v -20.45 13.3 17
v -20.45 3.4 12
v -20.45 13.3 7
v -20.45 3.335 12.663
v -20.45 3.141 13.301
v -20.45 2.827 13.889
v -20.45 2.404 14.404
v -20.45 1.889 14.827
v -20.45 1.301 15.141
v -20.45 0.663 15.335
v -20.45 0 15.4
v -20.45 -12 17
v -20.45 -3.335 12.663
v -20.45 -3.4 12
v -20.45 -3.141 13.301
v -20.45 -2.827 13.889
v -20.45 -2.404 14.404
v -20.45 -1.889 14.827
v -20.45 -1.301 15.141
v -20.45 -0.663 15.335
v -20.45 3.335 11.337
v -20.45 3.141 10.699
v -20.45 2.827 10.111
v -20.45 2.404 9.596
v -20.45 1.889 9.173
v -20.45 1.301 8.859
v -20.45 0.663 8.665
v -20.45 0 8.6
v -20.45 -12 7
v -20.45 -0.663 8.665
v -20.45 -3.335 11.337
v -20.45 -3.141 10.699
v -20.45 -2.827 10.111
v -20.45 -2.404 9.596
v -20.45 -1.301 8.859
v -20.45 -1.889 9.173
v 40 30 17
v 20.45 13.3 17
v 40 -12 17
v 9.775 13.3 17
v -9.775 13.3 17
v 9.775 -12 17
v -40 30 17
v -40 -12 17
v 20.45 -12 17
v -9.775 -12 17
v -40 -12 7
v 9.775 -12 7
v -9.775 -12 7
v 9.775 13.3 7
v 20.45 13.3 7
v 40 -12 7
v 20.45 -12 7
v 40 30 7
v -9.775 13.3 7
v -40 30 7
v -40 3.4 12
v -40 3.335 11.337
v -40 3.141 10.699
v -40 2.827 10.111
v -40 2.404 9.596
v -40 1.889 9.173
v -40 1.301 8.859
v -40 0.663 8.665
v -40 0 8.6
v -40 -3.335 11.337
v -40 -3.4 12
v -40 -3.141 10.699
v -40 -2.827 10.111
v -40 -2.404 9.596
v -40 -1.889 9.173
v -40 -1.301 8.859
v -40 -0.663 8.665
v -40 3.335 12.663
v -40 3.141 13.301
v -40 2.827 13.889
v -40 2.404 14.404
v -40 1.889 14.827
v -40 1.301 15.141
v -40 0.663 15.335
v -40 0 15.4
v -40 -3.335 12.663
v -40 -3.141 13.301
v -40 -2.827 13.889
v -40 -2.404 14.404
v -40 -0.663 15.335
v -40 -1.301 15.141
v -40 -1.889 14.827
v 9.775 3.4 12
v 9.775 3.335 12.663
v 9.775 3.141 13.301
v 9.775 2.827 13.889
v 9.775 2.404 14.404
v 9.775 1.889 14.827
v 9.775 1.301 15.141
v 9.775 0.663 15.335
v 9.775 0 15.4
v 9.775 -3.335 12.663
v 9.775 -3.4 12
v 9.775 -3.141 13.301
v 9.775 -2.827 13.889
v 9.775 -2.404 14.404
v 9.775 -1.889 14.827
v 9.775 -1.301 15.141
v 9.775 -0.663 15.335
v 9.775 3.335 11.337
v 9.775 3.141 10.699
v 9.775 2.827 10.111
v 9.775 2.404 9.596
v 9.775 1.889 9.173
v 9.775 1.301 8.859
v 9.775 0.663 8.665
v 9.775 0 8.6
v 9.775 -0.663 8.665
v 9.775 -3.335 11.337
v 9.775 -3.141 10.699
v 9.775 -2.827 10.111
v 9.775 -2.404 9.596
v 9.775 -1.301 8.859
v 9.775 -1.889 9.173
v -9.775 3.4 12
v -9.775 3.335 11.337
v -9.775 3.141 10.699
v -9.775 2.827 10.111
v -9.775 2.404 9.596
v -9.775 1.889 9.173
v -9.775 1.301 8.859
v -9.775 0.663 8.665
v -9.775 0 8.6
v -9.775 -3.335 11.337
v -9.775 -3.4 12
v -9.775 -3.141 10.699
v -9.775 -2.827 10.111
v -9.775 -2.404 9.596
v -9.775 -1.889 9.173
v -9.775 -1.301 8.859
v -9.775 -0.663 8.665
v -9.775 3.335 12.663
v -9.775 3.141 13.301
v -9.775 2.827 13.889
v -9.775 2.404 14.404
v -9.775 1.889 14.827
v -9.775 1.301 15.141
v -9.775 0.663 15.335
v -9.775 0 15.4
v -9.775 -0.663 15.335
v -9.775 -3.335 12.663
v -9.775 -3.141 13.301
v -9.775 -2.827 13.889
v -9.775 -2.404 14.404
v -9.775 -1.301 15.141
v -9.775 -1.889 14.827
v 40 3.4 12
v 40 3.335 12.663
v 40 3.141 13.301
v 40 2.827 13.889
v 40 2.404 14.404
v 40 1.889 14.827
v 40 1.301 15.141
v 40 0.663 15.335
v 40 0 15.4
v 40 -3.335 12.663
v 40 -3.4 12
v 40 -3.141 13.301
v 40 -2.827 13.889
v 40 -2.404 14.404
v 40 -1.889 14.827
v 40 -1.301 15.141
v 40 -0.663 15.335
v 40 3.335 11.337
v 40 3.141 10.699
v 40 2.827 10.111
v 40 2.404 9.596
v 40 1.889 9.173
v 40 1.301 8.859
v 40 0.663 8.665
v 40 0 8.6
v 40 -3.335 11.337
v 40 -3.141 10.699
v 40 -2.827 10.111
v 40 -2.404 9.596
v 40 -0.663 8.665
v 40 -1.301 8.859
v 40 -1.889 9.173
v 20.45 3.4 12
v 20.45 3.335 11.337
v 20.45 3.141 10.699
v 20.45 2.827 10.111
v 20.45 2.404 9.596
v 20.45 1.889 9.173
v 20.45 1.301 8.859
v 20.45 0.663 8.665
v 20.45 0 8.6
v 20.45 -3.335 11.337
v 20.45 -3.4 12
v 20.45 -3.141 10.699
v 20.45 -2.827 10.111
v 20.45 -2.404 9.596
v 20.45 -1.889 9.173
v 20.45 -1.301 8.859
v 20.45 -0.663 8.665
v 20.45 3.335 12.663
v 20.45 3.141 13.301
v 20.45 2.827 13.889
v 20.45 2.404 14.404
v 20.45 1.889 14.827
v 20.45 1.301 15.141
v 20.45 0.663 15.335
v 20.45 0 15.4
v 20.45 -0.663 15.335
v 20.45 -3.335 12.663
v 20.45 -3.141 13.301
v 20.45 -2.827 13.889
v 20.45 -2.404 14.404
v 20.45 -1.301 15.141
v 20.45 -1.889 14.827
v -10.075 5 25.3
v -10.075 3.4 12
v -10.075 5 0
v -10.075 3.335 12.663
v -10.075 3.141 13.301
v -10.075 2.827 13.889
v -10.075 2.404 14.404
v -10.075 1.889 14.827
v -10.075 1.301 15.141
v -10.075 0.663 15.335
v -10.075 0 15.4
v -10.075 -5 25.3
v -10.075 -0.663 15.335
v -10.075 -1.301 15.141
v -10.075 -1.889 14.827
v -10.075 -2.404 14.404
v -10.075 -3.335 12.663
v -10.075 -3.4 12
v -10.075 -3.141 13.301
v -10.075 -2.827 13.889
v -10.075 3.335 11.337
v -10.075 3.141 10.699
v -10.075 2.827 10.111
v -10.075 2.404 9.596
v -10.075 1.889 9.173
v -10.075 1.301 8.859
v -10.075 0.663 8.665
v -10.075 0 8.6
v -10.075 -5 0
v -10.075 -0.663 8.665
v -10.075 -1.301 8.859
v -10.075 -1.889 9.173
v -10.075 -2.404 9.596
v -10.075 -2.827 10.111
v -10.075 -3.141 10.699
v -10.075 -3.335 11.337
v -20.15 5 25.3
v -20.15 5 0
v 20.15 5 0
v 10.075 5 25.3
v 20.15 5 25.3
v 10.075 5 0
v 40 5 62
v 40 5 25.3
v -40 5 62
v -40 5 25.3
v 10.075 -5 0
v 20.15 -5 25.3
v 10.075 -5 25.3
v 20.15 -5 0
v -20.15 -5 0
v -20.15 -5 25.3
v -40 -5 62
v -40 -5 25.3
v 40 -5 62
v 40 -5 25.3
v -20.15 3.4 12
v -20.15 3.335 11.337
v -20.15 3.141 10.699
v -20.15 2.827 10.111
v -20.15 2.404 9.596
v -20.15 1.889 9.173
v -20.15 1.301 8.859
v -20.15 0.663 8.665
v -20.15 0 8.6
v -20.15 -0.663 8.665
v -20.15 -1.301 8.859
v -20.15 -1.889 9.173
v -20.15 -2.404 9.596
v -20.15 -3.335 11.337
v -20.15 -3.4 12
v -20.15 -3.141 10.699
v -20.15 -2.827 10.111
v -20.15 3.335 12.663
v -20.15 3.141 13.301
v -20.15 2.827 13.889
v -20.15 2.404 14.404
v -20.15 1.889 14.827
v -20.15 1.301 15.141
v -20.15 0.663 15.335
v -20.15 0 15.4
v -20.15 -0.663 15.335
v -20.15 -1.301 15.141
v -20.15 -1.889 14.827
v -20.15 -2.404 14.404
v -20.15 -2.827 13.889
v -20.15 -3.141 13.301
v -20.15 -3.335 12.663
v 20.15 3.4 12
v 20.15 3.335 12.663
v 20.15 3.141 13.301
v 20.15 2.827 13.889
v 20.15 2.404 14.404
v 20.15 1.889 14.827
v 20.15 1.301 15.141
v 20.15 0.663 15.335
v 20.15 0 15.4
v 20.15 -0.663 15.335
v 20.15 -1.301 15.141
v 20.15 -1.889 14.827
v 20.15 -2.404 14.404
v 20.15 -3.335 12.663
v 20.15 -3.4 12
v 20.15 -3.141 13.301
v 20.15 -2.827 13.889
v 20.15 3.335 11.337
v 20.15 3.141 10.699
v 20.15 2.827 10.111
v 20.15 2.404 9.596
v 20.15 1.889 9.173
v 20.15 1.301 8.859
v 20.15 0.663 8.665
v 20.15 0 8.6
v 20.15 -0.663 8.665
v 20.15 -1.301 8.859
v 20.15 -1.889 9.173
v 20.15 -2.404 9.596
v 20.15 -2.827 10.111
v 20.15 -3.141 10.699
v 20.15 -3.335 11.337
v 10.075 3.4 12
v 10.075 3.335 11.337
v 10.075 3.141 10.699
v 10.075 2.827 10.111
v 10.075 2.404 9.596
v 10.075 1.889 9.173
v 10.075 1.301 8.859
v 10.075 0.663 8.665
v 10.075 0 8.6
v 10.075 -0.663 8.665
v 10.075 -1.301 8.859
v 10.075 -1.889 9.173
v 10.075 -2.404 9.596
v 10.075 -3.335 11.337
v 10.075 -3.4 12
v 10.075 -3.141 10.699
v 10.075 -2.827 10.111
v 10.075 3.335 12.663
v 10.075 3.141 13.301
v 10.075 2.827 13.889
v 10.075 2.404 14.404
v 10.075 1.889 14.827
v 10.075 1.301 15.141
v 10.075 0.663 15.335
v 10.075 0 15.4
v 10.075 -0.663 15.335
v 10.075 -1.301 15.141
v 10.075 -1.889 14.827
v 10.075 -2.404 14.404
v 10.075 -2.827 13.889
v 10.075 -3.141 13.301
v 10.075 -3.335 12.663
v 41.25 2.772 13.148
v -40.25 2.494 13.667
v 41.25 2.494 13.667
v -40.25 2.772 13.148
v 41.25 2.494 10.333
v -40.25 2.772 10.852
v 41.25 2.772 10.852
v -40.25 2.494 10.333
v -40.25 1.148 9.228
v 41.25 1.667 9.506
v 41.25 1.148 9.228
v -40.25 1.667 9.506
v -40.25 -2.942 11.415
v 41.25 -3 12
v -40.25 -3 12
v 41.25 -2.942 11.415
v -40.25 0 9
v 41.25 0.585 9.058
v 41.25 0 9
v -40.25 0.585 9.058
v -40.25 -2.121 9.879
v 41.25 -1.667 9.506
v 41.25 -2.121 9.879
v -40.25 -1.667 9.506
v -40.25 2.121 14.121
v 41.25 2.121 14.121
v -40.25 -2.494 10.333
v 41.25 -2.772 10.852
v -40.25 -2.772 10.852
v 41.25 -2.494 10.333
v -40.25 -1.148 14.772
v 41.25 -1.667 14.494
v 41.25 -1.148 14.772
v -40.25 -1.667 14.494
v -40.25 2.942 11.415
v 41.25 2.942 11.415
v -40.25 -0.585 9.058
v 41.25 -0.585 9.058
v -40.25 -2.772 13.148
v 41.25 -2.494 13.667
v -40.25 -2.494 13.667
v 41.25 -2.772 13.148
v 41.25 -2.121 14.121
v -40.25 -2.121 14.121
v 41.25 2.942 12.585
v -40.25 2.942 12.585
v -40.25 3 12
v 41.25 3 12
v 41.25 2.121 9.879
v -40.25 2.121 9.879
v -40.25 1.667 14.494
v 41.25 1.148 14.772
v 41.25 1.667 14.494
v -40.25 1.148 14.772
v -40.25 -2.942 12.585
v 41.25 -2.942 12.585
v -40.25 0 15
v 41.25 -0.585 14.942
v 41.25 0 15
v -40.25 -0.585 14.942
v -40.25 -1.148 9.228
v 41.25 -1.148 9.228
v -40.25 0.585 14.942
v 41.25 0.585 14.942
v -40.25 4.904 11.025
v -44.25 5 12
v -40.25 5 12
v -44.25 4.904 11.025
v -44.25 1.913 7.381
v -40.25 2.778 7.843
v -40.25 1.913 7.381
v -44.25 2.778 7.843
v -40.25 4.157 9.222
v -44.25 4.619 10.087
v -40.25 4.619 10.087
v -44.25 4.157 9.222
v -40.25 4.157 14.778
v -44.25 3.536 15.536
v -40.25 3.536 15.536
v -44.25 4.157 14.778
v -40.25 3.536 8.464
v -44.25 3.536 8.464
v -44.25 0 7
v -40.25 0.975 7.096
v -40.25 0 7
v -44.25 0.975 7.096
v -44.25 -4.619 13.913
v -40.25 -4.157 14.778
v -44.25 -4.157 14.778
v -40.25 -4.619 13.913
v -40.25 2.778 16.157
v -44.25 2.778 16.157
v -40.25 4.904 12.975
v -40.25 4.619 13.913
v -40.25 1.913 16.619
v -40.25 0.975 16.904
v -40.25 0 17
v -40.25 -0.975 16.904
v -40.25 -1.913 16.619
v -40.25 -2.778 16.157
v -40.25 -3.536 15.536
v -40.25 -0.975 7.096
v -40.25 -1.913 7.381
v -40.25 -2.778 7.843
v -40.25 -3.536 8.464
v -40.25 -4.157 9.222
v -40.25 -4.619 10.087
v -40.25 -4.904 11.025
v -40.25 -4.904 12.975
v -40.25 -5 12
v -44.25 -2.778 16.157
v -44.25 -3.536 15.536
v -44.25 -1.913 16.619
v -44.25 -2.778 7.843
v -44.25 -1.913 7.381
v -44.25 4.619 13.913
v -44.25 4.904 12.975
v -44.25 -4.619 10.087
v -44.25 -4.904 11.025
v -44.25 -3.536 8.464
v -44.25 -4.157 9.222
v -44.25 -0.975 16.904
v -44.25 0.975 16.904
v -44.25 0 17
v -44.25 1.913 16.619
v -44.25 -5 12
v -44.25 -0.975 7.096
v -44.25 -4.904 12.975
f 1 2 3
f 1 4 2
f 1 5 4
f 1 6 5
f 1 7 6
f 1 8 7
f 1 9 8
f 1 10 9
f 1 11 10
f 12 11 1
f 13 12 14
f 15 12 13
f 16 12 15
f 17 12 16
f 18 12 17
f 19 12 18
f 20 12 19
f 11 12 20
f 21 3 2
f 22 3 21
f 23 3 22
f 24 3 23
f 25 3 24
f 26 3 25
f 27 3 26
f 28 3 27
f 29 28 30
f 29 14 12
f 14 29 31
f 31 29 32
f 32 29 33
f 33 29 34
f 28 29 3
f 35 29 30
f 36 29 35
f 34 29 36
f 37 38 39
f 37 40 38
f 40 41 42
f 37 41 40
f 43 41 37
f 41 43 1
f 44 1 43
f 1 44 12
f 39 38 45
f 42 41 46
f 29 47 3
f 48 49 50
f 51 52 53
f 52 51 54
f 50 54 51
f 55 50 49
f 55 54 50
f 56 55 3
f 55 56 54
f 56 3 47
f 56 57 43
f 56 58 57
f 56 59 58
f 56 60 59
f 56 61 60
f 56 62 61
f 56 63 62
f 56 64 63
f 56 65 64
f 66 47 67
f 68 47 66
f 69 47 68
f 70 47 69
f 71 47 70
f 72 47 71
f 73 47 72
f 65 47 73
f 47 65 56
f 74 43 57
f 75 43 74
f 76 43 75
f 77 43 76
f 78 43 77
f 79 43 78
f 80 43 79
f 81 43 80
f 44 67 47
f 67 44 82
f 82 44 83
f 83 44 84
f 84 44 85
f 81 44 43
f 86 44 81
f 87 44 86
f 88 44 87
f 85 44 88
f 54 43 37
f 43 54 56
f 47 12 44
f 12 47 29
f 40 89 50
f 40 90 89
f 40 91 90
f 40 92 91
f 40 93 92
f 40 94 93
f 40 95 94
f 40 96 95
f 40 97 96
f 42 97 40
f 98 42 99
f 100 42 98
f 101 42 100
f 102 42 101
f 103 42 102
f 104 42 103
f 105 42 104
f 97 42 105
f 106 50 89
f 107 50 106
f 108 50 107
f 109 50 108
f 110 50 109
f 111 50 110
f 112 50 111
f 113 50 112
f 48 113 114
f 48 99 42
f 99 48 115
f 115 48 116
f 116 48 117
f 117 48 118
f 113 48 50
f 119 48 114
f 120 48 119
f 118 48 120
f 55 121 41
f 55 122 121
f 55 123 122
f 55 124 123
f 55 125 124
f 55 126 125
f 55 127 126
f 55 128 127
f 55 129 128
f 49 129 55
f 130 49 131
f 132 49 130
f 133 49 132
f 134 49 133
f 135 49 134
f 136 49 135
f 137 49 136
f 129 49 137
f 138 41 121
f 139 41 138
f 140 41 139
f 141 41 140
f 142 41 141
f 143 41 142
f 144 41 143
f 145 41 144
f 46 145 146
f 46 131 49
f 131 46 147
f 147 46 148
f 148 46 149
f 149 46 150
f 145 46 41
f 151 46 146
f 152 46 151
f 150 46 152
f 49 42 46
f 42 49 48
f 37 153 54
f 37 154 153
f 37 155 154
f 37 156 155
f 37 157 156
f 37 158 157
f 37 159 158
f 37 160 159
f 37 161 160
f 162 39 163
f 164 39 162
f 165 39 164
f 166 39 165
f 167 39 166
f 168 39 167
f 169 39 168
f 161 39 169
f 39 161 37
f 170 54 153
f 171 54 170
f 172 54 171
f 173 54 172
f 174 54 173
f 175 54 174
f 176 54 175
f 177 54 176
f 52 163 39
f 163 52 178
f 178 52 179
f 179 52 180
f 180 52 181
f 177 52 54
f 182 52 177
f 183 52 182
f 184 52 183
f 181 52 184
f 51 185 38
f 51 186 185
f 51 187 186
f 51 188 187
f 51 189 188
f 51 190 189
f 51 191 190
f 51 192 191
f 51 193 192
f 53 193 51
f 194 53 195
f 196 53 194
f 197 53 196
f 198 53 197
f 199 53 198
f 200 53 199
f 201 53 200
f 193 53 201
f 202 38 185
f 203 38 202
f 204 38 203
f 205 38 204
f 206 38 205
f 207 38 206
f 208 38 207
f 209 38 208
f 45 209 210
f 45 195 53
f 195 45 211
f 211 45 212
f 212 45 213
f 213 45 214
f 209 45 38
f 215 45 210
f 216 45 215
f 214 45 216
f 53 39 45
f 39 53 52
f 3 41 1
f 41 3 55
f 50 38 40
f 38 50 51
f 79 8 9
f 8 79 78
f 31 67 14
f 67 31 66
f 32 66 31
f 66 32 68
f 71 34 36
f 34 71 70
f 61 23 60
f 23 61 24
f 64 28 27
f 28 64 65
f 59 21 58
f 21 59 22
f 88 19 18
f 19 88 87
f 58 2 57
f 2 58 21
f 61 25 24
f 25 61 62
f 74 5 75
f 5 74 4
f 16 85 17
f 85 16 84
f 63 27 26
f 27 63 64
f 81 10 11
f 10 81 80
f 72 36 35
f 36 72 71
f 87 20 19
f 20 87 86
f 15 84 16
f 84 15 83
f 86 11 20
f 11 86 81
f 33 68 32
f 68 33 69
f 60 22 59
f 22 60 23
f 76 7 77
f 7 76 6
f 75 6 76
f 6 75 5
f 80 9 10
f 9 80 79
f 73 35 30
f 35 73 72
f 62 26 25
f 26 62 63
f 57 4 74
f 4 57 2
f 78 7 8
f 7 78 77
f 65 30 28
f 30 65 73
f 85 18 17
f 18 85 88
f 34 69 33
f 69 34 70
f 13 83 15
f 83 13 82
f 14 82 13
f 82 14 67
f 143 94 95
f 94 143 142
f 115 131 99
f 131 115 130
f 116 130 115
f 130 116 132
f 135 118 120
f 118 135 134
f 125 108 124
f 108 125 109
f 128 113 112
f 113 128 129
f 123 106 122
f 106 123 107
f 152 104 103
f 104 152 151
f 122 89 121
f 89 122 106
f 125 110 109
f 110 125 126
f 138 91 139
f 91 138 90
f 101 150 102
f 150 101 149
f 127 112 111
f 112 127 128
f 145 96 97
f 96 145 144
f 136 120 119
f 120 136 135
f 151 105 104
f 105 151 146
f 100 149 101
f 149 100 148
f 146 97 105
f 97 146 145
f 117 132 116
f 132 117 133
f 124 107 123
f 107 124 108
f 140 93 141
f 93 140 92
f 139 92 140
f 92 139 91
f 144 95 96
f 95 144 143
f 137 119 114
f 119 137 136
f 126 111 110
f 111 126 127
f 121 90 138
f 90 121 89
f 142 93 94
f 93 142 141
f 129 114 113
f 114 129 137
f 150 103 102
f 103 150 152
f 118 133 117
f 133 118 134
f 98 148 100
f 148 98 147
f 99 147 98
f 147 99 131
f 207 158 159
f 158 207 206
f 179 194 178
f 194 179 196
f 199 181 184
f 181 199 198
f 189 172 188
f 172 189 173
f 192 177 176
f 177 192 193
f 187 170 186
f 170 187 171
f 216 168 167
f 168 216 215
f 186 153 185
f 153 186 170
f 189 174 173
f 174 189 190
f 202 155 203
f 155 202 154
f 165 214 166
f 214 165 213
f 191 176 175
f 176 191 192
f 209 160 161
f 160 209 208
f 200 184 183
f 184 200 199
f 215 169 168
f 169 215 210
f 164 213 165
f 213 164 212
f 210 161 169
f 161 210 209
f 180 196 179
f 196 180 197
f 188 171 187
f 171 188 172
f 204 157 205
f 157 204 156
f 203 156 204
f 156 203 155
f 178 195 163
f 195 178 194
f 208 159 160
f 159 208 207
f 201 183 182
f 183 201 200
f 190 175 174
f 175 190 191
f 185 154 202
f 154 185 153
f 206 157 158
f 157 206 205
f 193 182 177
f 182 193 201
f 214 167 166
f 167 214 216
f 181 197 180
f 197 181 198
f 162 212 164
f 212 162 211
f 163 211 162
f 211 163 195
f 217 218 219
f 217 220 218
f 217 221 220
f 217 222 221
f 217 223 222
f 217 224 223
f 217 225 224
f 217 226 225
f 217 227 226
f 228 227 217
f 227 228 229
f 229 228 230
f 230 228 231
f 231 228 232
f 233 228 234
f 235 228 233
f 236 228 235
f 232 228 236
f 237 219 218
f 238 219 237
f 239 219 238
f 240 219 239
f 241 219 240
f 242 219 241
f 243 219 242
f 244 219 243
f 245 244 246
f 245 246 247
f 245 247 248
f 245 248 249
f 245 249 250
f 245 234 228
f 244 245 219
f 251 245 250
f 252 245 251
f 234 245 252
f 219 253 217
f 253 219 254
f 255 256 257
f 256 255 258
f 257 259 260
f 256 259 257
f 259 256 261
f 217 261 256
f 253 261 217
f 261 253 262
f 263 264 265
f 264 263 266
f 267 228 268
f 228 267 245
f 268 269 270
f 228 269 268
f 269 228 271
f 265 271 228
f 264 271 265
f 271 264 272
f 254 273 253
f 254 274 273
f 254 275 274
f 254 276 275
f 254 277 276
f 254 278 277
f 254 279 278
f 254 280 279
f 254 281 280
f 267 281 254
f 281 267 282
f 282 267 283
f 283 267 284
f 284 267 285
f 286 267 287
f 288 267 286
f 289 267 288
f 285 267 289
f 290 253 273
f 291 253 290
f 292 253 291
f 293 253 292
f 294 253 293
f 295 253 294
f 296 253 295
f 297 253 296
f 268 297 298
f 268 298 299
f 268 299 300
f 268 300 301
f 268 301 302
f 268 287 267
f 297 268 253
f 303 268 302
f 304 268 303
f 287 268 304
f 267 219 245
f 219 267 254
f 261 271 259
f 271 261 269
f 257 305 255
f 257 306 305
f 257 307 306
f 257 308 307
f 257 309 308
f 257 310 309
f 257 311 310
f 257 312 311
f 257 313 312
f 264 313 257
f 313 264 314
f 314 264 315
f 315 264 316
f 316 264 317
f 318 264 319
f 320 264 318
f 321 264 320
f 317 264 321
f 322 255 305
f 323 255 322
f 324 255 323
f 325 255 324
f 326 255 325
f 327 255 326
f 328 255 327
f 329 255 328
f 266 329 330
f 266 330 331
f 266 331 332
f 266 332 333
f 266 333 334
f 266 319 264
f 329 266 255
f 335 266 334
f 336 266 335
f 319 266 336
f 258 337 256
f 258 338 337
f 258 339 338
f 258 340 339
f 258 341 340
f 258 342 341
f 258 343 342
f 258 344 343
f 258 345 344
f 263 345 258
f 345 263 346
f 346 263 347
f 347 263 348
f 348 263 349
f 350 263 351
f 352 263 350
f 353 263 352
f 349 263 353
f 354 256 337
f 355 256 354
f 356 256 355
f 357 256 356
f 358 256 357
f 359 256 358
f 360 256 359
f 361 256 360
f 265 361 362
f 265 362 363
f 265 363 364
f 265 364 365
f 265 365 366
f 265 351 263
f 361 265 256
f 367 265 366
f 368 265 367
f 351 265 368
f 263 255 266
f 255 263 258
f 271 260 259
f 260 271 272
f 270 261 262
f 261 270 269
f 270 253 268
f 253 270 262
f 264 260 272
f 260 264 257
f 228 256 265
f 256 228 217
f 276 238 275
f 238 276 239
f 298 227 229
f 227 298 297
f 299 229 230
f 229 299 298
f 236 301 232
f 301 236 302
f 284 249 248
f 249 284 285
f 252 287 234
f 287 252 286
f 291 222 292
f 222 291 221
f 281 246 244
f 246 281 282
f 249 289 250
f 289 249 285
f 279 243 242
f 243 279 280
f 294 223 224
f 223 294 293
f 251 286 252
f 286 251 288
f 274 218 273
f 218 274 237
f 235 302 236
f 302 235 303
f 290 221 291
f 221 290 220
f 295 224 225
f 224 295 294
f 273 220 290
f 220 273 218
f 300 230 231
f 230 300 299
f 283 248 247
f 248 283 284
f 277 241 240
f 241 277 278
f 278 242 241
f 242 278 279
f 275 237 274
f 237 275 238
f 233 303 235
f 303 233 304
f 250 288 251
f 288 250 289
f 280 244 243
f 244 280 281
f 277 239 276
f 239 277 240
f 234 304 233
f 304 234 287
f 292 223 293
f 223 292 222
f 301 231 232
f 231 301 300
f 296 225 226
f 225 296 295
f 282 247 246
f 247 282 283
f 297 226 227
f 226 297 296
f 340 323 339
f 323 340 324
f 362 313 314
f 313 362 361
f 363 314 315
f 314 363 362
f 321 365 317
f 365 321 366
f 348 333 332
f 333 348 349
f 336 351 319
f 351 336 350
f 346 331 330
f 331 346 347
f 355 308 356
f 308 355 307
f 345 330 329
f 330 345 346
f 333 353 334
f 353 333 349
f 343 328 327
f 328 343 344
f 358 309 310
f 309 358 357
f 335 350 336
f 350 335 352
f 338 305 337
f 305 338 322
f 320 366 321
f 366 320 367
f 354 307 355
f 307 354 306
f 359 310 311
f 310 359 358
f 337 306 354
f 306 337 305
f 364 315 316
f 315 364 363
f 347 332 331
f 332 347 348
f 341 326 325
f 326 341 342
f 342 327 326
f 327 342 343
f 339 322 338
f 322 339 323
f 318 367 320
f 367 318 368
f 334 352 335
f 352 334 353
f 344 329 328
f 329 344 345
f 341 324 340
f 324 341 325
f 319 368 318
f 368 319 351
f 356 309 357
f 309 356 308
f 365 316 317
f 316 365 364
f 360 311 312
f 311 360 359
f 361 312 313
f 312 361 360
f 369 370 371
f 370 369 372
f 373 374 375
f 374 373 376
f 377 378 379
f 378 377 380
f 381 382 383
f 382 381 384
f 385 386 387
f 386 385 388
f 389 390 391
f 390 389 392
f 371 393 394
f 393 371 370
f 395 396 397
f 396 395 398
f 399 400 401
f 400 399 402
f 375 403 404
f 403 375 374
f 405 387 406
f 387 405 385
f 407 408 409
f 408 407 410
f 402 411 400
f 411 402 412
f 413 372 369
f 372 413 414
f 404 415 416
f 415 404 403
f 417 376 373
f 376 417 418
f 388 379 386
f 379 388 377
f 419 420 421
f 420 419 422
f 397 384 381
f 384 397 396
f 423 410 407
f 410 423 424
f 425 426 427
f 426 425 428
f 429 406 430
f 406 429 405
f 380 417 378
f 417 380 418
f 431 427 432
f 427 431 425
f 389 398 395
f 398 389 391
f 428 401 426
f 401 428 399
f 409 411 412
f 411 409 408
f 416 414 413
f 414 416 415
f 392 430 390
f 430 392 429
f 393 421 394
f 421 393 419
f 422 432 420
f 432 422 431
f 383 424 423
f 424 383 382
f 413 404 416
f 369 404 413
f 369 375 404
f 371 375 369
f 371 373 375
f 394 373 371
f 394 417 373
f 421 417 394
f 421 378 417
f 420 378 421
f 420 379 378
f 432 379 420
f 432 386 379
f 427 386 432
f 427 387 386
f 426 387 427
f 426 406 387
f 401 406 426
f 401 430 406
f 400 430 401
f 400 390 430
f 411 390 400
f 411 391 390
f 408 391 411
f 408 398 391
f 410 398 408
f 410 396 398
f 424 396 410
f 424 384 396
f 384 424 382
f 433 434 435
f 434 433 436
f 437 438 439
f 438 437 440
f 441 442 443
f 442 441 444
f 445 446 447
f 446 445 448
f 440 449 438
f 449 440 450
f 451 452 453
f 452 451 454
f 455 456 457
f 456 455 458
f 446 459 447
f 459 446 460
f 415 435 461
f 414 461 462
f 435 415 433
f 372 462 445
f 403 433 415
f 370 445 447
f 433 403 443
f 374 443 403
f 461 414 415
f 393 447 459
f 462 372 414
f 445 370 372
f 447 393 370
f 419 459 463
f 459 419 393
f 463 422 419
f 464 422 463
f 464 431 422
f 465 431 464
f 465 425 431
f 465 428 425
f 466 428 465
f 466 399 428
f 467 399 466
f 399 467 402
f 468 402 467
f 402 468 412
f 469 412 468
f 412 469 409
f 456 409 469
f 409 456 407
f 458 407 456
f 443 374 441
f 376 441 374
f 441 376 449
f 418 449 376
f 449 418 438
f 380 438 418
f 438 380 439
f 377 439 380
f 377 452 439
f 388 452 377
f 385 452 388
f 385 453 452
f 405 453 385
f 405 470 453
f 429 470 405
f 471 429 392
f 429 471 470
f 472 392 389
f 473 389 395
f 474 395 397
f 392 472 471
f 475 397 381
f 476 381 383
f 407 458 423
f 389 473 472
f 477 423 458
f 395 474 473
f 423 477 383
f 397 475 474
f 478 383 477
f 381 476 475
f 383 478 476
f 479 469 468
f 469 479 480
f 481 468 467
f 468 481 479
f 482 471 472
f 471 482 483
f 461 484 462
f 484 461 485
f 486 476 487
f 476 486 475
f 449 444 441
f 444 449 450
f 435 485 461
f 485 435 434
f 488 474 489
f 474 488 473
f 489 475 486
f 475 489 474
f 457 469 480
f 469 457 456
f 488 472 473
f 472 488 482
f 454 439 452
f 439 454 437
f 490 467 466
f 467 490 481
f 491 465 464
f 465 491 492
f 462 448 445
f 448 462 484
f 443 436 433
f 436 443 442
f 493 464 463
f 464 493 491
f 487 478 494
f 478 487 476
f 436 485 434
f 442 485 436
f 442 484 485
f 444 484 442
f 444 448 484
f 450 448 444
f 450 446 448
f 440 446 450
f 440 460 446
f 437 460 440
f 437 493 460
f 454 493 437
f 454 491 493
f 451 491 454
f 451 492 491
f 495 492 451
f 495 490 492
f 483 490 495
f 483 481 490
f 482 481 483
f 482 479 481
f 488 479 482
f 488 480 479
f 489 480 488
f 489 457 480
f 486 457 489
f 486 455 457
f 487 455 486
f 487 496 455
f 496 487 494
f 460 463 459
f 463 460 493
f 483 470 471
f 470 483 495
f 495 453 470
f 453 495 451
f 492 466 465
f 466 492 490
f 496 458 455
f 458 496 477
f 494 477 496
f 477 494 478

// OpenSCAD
$fn = 32;

// ------------------------------------------------------------------------
// Butt hinge: hinge 80 mm, leaf swung 270 deg
// Every part is its own module, assembly() places every instance.
// ------------------------------------------------------------------------

// --- part 1 ---
module hinge_base() {
  difference() {
    union() {
      translate([-40, -12, -5]) cube([19.55, 42, 10]);
      translate([-9.775, -12, -5]) cube([19.55, 42, 10]);
      translate([20.45, -12, -5]) cube([19.55, 42, 10]);
      translate([-40, 13.3, -5]) cube([80, 16.7, 10]);
    }
    translate([-30.225, 0, 0]) rotate([0, 90, 0]) cylinder(h = 21.55, d = 6.8, center = true);
    translate([0, 0, 0]) rotate([0, 90, 0]) cylinder(h = 21.55, d = 6.8, center = true);
    translate([30.225, 0, 0]) rotate([0, 90, 0]) cylinder(h = 21.55, d = 6.8, center = true);
  }
}

// --- part 2 ---
module hinge_mover() {
  difference() {
    union() {
      translate([-20.15, -50, -5]) cube([10.075, 62, 10]);
      translate([10.075, -50, -5]) cube([10.075, 62, 10]);
      translate([-40, -50, -5]) cube([80, 36.7, 10]);
    }
    translate([-15.113, 0, 0]) rotate([0, 90, 0]) cylinder(h = 12.075, d = 6.8, center = true);
    translate([15.113, 0, 0]) rotate([0, 90, 0]) cylinder(h = 12.075, d = 6.8, center = true);
  }
}

// --- part 3 ---
module hinge_pin() {
  rotate([0, 90, 0]) cylinder(h = 82.5, d = 6, center = true);
  translate([-44.25, 0, 0]) rotate([0, 90, 0]) cylinder(h = 4, d = 10);
}

// --- assembly ---
module assembly() {
  color([0.80, 0.24, 0.20]) translate([0, 0, 12]) rotate([0, 0, 0]) hinge_base();
  color([0.20, 0.45, 0.75]) translate([0, 0, 12]) rotate([270, 0, 0]) hinge_mover();
  color([0.25, 0.62, 0.32]) translate([0, 0, 12]) rotate([0, 0, 0]) hinge_pin();
}

assembly();
